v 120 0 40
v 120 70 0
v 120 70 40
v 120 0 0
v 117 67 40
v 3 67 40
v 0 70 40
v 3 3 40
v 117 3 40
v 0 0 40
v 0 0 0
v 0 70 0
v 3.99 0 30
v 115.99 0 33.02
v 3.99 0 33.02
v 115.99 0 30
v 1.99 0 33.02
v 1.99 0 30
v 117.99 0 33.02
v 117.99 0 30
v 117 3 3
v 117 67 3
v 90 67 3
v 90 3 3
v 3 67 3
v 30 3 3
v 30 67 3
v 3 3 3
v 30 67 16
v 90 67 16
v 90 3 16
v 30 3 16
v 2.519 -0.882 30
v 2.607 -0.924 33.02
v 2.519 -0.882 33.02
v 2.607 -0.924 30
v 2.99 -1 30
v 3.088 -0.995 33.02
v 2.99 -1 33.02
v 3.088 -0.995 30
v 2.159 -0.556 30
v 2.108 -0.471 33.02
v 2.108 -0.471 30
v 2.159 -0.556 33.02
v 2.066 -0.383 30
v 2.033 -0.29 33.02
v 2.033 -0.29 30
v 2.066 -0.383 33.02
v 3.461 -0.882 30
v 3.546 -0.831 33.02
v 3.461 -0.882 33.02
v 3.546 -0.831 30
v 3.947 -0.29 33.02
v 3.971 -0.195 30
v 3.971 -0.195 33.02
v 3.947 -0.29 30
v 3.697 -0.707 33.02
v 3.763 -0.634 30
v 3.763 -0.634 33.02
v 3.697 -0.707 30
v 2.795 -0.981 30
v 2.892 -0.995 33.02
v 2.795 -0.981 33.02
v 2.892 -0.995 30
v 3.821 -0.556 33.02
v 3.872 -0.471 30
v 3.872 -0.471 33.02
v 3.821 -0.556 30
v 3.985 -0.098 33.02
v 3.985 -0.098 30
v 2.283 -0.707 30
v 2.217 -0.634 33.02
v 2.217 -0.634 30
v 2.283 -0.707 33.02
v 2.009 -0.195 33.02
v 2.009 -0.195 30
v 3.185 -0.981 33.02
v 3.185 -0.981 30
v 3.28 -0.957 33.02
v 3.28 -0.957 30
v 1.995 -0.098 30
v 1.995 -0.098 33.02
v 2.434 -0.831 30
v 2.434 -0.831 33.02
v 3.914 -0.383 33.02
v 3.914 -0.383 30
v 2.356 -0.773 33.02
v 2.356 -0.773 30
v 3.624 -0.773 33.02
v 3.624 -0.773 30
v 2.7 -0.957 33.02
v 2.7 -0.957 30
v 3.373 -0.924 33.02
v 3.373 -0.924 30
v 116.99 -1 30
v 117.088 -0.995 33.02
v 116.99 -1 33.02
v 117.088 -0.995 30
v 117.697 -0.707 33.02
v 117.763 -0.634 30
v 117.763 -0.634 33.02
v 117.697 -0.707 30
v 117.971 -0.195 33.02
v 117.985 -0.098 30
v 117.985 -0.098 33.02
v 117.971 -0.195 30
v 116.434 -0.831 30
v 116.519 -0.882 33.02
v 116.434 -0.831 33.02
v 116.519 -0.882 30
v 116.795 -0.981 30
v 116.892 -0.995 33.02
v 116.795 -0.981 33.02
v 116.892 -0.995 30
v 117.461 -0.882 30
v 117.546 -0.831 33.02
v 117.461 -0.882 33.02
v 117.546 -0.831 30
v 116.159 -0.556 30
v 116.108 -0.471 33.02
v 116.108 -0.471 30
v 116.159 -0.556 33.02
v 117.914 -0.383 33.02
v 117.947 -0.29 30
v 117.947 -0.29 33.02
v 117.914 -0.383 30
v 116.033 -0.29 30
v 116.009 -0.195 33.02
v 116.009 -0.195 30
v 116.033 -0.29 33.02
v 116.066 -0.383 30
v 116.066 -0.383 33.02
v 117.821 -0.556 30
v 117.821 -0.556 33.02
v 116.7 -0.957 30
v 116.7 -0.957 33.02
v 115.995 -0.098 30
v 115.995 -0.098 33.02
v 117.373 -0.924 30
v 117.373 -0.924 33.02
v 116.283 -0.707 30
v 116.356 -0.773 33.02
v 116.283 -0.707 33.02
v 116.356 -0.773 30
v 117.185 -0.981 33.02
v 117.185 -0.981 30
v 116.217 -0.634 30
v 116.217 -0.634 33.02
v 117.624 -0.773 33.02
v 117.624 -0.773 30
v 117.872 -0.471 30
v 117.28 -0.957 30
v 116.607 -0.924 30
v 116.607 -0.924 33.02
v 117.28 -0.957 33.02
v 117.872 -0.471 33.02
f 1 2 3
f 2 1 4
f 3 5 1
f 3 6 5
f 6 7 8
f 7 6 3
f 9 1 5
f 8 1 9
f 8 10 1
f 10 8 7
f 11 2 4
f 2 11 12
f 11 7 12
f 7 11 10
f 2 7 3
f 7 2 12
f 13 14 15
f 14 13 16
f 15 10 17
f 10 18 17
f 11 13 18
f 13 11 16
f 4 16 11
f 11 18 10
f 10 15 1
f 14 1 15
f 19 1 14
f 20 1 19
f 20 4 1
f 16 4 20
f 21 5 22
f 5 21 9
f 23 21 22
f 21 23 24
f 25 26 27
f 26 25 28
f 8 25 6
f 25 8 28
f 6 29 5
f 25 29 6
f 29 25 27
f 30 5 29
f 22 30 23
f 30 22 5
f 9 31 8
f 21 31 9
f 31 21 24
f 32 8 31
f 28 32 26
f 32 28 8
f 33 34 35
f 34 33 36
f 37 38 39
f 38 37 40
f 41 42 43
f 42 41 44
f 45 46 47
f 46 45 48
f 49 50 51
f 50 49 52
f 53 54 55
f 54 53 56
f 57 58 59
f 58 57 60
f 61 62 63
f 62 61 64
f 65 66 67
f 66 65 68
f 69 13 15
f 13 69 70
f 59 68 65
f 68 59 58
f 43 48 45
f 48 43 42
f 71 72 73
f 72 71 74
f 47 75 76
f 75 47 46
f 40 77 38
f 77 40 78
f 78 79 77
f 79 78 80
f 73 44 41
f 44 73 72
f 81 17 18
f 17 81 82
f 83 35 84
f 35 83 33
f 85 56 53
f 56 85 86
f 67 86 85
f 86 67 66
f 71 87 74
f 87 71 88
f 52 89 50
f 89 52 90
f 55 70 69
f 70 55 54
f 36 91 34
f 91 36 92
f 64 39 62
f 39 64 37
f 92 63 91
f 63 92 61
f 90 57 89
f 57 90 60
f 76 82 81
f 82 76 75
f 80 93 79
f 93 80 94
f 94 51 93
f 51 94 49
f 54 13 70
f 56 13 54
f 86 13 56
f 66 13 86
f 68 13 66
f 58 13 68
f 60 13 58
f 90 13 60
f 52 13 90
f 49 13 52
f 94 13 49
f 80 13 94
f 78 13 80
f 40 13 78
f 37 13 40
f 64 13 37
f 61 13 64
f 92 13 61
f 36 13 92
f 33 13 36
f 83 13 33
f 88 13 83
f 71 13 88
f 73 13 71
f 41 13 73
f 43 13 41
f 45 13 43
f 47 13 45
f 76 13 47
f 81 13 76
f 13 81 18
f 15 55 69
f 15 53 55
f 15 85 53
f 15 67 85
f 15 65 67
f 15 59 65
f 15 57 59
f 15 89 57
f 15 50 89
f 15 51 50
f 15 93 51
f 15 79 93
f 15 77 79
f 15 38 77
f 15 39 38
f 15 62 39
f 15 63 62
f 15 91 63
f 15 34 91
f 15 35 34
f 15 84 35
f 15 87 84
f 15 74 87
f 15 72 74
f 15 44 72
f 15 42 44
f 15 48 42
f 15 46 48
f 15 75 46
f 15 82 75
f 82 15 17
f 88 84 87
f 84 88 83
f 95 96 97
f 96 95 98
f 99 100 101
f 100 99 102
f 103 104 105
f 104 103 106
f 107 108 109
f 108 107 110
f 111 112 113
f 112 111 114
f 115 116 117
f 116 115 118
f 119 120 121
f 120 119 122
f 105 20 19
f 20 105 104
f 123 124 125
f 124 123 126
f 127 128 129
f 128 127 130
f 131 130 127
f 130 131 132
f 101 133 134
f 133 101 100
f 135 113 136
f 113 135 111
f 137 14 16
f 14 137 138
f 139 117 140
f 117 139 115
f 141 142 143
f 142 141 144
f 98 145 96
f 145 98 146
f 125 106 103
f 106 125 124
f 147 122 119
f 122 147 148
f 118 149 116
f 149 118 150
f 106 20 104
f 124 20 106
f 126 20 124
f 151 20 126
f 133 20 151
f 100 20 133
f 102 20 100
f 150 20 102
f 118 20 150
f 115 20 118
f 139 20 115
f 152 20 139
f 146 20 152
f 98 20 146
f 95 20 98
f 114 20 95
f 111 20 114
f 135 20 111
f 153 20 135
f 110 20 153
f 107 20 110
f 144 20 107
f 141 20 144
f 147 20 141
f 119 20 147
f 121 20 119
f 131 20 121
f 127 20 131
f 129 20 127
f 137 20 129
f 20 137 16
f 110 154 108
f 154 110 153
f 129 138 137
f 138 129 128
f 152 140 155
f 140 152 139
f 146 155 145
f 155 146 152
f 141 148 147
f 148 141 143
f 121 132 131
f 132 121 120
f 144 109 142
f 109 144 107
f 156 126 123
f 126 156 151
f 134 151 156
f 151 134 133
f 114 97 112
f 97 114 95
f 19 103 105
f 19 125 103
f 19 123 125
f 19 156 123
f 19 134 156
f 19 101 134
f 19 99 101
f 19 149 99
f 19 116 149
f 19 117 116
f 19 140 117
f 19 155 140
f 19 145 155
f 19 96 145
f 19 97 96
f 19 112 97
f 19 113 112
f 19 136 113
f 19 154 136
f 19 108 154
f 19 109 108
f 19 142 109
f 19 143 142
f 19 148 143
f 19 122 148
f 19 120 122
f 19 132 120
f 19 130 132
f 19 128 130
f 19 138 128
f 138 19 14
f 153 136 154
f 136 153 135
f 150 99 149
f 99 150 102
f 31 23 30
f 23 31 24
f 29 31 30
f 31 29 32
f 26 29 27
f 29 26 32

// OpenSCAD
// Buffer tank for mini horizontal gel-electrophoresis box
// Outer dimensions: 120 mm (X) x 70 mm (Y) x 40 mm (Z)
// Wall thickness: 3 mm, Floor thickness: 3 mm
// Platform: 60 mm long in X (centred), full inner width (Y), top at z = 13 (10 mm above inner floor)
// Electrode holes: 2 mm diameter, horizontal, at y = 0, z = 30, through each end wall

$fn = 64;

// Dimensions
outer_x = 120;
outer_y = 70;
outer_z = 40;
wall_thick = 3;
floor_thick = 3;
platform_height = 13; // z-coordinate of platform top (from base)
hole_z = 30;
hole_d = 2;

// Inner dimensions
inner_x = outer_x - 2 * wall_thick;
inner_y = outer_y - 2 * wall_thick;
inner_z = outer_z - floor_thick;

// Platform dimensions
platform_x = 60;
platform_y = inner_y;
platform_z = platform_height;

// Calculate positions
half_outer_x = outer_x / 2;
half_outer_y = outer_y / 2;

// Main tank shell
module tank_shell() {
    difference() {
        // Outer shell
        cube([outer_x, outer_y, outer_z]);
        
        // Inner cavity (removes interior)
        translate([wall_thick, wall_thick, floor_thick])
            cube([inner_x, inner_y, inner_z]);
    }
}

// Platform (solid raised platform)
module platform() {
    platform_start_x = (outer_x - platform_x) / 2;
    translate([platform_start_x, wall_thick, floor_thick])
        cube([platform_x, inner_y, platform_z]);
}

// Electrode holes - properly constrained within tank walls
module electrode_holes() {
    // Left hole (through left wall at x = wall_thick)
    translate([wall_thick - 0.01, 0, hole_z])
        cylinder(h = wall_thick + 0.02, r = hole_d / 2);
    
    // Right hole (through right wall at x = outer_x - wall_thick)
    translate([outer_x - wall_thick - 0.01, 0, hole_z])
        cylinder(h = wall_thick + 0.02, r = hole_d / 2);
}

// Build the buffer tank
module buffer_tank() {
    union() {
        // Tank shell
        tank_shell();
        
        // Platform
        platform();
        
        // Electrode holes
        electrode_holes();
    }
}

// Final tank
buffer_tank();
